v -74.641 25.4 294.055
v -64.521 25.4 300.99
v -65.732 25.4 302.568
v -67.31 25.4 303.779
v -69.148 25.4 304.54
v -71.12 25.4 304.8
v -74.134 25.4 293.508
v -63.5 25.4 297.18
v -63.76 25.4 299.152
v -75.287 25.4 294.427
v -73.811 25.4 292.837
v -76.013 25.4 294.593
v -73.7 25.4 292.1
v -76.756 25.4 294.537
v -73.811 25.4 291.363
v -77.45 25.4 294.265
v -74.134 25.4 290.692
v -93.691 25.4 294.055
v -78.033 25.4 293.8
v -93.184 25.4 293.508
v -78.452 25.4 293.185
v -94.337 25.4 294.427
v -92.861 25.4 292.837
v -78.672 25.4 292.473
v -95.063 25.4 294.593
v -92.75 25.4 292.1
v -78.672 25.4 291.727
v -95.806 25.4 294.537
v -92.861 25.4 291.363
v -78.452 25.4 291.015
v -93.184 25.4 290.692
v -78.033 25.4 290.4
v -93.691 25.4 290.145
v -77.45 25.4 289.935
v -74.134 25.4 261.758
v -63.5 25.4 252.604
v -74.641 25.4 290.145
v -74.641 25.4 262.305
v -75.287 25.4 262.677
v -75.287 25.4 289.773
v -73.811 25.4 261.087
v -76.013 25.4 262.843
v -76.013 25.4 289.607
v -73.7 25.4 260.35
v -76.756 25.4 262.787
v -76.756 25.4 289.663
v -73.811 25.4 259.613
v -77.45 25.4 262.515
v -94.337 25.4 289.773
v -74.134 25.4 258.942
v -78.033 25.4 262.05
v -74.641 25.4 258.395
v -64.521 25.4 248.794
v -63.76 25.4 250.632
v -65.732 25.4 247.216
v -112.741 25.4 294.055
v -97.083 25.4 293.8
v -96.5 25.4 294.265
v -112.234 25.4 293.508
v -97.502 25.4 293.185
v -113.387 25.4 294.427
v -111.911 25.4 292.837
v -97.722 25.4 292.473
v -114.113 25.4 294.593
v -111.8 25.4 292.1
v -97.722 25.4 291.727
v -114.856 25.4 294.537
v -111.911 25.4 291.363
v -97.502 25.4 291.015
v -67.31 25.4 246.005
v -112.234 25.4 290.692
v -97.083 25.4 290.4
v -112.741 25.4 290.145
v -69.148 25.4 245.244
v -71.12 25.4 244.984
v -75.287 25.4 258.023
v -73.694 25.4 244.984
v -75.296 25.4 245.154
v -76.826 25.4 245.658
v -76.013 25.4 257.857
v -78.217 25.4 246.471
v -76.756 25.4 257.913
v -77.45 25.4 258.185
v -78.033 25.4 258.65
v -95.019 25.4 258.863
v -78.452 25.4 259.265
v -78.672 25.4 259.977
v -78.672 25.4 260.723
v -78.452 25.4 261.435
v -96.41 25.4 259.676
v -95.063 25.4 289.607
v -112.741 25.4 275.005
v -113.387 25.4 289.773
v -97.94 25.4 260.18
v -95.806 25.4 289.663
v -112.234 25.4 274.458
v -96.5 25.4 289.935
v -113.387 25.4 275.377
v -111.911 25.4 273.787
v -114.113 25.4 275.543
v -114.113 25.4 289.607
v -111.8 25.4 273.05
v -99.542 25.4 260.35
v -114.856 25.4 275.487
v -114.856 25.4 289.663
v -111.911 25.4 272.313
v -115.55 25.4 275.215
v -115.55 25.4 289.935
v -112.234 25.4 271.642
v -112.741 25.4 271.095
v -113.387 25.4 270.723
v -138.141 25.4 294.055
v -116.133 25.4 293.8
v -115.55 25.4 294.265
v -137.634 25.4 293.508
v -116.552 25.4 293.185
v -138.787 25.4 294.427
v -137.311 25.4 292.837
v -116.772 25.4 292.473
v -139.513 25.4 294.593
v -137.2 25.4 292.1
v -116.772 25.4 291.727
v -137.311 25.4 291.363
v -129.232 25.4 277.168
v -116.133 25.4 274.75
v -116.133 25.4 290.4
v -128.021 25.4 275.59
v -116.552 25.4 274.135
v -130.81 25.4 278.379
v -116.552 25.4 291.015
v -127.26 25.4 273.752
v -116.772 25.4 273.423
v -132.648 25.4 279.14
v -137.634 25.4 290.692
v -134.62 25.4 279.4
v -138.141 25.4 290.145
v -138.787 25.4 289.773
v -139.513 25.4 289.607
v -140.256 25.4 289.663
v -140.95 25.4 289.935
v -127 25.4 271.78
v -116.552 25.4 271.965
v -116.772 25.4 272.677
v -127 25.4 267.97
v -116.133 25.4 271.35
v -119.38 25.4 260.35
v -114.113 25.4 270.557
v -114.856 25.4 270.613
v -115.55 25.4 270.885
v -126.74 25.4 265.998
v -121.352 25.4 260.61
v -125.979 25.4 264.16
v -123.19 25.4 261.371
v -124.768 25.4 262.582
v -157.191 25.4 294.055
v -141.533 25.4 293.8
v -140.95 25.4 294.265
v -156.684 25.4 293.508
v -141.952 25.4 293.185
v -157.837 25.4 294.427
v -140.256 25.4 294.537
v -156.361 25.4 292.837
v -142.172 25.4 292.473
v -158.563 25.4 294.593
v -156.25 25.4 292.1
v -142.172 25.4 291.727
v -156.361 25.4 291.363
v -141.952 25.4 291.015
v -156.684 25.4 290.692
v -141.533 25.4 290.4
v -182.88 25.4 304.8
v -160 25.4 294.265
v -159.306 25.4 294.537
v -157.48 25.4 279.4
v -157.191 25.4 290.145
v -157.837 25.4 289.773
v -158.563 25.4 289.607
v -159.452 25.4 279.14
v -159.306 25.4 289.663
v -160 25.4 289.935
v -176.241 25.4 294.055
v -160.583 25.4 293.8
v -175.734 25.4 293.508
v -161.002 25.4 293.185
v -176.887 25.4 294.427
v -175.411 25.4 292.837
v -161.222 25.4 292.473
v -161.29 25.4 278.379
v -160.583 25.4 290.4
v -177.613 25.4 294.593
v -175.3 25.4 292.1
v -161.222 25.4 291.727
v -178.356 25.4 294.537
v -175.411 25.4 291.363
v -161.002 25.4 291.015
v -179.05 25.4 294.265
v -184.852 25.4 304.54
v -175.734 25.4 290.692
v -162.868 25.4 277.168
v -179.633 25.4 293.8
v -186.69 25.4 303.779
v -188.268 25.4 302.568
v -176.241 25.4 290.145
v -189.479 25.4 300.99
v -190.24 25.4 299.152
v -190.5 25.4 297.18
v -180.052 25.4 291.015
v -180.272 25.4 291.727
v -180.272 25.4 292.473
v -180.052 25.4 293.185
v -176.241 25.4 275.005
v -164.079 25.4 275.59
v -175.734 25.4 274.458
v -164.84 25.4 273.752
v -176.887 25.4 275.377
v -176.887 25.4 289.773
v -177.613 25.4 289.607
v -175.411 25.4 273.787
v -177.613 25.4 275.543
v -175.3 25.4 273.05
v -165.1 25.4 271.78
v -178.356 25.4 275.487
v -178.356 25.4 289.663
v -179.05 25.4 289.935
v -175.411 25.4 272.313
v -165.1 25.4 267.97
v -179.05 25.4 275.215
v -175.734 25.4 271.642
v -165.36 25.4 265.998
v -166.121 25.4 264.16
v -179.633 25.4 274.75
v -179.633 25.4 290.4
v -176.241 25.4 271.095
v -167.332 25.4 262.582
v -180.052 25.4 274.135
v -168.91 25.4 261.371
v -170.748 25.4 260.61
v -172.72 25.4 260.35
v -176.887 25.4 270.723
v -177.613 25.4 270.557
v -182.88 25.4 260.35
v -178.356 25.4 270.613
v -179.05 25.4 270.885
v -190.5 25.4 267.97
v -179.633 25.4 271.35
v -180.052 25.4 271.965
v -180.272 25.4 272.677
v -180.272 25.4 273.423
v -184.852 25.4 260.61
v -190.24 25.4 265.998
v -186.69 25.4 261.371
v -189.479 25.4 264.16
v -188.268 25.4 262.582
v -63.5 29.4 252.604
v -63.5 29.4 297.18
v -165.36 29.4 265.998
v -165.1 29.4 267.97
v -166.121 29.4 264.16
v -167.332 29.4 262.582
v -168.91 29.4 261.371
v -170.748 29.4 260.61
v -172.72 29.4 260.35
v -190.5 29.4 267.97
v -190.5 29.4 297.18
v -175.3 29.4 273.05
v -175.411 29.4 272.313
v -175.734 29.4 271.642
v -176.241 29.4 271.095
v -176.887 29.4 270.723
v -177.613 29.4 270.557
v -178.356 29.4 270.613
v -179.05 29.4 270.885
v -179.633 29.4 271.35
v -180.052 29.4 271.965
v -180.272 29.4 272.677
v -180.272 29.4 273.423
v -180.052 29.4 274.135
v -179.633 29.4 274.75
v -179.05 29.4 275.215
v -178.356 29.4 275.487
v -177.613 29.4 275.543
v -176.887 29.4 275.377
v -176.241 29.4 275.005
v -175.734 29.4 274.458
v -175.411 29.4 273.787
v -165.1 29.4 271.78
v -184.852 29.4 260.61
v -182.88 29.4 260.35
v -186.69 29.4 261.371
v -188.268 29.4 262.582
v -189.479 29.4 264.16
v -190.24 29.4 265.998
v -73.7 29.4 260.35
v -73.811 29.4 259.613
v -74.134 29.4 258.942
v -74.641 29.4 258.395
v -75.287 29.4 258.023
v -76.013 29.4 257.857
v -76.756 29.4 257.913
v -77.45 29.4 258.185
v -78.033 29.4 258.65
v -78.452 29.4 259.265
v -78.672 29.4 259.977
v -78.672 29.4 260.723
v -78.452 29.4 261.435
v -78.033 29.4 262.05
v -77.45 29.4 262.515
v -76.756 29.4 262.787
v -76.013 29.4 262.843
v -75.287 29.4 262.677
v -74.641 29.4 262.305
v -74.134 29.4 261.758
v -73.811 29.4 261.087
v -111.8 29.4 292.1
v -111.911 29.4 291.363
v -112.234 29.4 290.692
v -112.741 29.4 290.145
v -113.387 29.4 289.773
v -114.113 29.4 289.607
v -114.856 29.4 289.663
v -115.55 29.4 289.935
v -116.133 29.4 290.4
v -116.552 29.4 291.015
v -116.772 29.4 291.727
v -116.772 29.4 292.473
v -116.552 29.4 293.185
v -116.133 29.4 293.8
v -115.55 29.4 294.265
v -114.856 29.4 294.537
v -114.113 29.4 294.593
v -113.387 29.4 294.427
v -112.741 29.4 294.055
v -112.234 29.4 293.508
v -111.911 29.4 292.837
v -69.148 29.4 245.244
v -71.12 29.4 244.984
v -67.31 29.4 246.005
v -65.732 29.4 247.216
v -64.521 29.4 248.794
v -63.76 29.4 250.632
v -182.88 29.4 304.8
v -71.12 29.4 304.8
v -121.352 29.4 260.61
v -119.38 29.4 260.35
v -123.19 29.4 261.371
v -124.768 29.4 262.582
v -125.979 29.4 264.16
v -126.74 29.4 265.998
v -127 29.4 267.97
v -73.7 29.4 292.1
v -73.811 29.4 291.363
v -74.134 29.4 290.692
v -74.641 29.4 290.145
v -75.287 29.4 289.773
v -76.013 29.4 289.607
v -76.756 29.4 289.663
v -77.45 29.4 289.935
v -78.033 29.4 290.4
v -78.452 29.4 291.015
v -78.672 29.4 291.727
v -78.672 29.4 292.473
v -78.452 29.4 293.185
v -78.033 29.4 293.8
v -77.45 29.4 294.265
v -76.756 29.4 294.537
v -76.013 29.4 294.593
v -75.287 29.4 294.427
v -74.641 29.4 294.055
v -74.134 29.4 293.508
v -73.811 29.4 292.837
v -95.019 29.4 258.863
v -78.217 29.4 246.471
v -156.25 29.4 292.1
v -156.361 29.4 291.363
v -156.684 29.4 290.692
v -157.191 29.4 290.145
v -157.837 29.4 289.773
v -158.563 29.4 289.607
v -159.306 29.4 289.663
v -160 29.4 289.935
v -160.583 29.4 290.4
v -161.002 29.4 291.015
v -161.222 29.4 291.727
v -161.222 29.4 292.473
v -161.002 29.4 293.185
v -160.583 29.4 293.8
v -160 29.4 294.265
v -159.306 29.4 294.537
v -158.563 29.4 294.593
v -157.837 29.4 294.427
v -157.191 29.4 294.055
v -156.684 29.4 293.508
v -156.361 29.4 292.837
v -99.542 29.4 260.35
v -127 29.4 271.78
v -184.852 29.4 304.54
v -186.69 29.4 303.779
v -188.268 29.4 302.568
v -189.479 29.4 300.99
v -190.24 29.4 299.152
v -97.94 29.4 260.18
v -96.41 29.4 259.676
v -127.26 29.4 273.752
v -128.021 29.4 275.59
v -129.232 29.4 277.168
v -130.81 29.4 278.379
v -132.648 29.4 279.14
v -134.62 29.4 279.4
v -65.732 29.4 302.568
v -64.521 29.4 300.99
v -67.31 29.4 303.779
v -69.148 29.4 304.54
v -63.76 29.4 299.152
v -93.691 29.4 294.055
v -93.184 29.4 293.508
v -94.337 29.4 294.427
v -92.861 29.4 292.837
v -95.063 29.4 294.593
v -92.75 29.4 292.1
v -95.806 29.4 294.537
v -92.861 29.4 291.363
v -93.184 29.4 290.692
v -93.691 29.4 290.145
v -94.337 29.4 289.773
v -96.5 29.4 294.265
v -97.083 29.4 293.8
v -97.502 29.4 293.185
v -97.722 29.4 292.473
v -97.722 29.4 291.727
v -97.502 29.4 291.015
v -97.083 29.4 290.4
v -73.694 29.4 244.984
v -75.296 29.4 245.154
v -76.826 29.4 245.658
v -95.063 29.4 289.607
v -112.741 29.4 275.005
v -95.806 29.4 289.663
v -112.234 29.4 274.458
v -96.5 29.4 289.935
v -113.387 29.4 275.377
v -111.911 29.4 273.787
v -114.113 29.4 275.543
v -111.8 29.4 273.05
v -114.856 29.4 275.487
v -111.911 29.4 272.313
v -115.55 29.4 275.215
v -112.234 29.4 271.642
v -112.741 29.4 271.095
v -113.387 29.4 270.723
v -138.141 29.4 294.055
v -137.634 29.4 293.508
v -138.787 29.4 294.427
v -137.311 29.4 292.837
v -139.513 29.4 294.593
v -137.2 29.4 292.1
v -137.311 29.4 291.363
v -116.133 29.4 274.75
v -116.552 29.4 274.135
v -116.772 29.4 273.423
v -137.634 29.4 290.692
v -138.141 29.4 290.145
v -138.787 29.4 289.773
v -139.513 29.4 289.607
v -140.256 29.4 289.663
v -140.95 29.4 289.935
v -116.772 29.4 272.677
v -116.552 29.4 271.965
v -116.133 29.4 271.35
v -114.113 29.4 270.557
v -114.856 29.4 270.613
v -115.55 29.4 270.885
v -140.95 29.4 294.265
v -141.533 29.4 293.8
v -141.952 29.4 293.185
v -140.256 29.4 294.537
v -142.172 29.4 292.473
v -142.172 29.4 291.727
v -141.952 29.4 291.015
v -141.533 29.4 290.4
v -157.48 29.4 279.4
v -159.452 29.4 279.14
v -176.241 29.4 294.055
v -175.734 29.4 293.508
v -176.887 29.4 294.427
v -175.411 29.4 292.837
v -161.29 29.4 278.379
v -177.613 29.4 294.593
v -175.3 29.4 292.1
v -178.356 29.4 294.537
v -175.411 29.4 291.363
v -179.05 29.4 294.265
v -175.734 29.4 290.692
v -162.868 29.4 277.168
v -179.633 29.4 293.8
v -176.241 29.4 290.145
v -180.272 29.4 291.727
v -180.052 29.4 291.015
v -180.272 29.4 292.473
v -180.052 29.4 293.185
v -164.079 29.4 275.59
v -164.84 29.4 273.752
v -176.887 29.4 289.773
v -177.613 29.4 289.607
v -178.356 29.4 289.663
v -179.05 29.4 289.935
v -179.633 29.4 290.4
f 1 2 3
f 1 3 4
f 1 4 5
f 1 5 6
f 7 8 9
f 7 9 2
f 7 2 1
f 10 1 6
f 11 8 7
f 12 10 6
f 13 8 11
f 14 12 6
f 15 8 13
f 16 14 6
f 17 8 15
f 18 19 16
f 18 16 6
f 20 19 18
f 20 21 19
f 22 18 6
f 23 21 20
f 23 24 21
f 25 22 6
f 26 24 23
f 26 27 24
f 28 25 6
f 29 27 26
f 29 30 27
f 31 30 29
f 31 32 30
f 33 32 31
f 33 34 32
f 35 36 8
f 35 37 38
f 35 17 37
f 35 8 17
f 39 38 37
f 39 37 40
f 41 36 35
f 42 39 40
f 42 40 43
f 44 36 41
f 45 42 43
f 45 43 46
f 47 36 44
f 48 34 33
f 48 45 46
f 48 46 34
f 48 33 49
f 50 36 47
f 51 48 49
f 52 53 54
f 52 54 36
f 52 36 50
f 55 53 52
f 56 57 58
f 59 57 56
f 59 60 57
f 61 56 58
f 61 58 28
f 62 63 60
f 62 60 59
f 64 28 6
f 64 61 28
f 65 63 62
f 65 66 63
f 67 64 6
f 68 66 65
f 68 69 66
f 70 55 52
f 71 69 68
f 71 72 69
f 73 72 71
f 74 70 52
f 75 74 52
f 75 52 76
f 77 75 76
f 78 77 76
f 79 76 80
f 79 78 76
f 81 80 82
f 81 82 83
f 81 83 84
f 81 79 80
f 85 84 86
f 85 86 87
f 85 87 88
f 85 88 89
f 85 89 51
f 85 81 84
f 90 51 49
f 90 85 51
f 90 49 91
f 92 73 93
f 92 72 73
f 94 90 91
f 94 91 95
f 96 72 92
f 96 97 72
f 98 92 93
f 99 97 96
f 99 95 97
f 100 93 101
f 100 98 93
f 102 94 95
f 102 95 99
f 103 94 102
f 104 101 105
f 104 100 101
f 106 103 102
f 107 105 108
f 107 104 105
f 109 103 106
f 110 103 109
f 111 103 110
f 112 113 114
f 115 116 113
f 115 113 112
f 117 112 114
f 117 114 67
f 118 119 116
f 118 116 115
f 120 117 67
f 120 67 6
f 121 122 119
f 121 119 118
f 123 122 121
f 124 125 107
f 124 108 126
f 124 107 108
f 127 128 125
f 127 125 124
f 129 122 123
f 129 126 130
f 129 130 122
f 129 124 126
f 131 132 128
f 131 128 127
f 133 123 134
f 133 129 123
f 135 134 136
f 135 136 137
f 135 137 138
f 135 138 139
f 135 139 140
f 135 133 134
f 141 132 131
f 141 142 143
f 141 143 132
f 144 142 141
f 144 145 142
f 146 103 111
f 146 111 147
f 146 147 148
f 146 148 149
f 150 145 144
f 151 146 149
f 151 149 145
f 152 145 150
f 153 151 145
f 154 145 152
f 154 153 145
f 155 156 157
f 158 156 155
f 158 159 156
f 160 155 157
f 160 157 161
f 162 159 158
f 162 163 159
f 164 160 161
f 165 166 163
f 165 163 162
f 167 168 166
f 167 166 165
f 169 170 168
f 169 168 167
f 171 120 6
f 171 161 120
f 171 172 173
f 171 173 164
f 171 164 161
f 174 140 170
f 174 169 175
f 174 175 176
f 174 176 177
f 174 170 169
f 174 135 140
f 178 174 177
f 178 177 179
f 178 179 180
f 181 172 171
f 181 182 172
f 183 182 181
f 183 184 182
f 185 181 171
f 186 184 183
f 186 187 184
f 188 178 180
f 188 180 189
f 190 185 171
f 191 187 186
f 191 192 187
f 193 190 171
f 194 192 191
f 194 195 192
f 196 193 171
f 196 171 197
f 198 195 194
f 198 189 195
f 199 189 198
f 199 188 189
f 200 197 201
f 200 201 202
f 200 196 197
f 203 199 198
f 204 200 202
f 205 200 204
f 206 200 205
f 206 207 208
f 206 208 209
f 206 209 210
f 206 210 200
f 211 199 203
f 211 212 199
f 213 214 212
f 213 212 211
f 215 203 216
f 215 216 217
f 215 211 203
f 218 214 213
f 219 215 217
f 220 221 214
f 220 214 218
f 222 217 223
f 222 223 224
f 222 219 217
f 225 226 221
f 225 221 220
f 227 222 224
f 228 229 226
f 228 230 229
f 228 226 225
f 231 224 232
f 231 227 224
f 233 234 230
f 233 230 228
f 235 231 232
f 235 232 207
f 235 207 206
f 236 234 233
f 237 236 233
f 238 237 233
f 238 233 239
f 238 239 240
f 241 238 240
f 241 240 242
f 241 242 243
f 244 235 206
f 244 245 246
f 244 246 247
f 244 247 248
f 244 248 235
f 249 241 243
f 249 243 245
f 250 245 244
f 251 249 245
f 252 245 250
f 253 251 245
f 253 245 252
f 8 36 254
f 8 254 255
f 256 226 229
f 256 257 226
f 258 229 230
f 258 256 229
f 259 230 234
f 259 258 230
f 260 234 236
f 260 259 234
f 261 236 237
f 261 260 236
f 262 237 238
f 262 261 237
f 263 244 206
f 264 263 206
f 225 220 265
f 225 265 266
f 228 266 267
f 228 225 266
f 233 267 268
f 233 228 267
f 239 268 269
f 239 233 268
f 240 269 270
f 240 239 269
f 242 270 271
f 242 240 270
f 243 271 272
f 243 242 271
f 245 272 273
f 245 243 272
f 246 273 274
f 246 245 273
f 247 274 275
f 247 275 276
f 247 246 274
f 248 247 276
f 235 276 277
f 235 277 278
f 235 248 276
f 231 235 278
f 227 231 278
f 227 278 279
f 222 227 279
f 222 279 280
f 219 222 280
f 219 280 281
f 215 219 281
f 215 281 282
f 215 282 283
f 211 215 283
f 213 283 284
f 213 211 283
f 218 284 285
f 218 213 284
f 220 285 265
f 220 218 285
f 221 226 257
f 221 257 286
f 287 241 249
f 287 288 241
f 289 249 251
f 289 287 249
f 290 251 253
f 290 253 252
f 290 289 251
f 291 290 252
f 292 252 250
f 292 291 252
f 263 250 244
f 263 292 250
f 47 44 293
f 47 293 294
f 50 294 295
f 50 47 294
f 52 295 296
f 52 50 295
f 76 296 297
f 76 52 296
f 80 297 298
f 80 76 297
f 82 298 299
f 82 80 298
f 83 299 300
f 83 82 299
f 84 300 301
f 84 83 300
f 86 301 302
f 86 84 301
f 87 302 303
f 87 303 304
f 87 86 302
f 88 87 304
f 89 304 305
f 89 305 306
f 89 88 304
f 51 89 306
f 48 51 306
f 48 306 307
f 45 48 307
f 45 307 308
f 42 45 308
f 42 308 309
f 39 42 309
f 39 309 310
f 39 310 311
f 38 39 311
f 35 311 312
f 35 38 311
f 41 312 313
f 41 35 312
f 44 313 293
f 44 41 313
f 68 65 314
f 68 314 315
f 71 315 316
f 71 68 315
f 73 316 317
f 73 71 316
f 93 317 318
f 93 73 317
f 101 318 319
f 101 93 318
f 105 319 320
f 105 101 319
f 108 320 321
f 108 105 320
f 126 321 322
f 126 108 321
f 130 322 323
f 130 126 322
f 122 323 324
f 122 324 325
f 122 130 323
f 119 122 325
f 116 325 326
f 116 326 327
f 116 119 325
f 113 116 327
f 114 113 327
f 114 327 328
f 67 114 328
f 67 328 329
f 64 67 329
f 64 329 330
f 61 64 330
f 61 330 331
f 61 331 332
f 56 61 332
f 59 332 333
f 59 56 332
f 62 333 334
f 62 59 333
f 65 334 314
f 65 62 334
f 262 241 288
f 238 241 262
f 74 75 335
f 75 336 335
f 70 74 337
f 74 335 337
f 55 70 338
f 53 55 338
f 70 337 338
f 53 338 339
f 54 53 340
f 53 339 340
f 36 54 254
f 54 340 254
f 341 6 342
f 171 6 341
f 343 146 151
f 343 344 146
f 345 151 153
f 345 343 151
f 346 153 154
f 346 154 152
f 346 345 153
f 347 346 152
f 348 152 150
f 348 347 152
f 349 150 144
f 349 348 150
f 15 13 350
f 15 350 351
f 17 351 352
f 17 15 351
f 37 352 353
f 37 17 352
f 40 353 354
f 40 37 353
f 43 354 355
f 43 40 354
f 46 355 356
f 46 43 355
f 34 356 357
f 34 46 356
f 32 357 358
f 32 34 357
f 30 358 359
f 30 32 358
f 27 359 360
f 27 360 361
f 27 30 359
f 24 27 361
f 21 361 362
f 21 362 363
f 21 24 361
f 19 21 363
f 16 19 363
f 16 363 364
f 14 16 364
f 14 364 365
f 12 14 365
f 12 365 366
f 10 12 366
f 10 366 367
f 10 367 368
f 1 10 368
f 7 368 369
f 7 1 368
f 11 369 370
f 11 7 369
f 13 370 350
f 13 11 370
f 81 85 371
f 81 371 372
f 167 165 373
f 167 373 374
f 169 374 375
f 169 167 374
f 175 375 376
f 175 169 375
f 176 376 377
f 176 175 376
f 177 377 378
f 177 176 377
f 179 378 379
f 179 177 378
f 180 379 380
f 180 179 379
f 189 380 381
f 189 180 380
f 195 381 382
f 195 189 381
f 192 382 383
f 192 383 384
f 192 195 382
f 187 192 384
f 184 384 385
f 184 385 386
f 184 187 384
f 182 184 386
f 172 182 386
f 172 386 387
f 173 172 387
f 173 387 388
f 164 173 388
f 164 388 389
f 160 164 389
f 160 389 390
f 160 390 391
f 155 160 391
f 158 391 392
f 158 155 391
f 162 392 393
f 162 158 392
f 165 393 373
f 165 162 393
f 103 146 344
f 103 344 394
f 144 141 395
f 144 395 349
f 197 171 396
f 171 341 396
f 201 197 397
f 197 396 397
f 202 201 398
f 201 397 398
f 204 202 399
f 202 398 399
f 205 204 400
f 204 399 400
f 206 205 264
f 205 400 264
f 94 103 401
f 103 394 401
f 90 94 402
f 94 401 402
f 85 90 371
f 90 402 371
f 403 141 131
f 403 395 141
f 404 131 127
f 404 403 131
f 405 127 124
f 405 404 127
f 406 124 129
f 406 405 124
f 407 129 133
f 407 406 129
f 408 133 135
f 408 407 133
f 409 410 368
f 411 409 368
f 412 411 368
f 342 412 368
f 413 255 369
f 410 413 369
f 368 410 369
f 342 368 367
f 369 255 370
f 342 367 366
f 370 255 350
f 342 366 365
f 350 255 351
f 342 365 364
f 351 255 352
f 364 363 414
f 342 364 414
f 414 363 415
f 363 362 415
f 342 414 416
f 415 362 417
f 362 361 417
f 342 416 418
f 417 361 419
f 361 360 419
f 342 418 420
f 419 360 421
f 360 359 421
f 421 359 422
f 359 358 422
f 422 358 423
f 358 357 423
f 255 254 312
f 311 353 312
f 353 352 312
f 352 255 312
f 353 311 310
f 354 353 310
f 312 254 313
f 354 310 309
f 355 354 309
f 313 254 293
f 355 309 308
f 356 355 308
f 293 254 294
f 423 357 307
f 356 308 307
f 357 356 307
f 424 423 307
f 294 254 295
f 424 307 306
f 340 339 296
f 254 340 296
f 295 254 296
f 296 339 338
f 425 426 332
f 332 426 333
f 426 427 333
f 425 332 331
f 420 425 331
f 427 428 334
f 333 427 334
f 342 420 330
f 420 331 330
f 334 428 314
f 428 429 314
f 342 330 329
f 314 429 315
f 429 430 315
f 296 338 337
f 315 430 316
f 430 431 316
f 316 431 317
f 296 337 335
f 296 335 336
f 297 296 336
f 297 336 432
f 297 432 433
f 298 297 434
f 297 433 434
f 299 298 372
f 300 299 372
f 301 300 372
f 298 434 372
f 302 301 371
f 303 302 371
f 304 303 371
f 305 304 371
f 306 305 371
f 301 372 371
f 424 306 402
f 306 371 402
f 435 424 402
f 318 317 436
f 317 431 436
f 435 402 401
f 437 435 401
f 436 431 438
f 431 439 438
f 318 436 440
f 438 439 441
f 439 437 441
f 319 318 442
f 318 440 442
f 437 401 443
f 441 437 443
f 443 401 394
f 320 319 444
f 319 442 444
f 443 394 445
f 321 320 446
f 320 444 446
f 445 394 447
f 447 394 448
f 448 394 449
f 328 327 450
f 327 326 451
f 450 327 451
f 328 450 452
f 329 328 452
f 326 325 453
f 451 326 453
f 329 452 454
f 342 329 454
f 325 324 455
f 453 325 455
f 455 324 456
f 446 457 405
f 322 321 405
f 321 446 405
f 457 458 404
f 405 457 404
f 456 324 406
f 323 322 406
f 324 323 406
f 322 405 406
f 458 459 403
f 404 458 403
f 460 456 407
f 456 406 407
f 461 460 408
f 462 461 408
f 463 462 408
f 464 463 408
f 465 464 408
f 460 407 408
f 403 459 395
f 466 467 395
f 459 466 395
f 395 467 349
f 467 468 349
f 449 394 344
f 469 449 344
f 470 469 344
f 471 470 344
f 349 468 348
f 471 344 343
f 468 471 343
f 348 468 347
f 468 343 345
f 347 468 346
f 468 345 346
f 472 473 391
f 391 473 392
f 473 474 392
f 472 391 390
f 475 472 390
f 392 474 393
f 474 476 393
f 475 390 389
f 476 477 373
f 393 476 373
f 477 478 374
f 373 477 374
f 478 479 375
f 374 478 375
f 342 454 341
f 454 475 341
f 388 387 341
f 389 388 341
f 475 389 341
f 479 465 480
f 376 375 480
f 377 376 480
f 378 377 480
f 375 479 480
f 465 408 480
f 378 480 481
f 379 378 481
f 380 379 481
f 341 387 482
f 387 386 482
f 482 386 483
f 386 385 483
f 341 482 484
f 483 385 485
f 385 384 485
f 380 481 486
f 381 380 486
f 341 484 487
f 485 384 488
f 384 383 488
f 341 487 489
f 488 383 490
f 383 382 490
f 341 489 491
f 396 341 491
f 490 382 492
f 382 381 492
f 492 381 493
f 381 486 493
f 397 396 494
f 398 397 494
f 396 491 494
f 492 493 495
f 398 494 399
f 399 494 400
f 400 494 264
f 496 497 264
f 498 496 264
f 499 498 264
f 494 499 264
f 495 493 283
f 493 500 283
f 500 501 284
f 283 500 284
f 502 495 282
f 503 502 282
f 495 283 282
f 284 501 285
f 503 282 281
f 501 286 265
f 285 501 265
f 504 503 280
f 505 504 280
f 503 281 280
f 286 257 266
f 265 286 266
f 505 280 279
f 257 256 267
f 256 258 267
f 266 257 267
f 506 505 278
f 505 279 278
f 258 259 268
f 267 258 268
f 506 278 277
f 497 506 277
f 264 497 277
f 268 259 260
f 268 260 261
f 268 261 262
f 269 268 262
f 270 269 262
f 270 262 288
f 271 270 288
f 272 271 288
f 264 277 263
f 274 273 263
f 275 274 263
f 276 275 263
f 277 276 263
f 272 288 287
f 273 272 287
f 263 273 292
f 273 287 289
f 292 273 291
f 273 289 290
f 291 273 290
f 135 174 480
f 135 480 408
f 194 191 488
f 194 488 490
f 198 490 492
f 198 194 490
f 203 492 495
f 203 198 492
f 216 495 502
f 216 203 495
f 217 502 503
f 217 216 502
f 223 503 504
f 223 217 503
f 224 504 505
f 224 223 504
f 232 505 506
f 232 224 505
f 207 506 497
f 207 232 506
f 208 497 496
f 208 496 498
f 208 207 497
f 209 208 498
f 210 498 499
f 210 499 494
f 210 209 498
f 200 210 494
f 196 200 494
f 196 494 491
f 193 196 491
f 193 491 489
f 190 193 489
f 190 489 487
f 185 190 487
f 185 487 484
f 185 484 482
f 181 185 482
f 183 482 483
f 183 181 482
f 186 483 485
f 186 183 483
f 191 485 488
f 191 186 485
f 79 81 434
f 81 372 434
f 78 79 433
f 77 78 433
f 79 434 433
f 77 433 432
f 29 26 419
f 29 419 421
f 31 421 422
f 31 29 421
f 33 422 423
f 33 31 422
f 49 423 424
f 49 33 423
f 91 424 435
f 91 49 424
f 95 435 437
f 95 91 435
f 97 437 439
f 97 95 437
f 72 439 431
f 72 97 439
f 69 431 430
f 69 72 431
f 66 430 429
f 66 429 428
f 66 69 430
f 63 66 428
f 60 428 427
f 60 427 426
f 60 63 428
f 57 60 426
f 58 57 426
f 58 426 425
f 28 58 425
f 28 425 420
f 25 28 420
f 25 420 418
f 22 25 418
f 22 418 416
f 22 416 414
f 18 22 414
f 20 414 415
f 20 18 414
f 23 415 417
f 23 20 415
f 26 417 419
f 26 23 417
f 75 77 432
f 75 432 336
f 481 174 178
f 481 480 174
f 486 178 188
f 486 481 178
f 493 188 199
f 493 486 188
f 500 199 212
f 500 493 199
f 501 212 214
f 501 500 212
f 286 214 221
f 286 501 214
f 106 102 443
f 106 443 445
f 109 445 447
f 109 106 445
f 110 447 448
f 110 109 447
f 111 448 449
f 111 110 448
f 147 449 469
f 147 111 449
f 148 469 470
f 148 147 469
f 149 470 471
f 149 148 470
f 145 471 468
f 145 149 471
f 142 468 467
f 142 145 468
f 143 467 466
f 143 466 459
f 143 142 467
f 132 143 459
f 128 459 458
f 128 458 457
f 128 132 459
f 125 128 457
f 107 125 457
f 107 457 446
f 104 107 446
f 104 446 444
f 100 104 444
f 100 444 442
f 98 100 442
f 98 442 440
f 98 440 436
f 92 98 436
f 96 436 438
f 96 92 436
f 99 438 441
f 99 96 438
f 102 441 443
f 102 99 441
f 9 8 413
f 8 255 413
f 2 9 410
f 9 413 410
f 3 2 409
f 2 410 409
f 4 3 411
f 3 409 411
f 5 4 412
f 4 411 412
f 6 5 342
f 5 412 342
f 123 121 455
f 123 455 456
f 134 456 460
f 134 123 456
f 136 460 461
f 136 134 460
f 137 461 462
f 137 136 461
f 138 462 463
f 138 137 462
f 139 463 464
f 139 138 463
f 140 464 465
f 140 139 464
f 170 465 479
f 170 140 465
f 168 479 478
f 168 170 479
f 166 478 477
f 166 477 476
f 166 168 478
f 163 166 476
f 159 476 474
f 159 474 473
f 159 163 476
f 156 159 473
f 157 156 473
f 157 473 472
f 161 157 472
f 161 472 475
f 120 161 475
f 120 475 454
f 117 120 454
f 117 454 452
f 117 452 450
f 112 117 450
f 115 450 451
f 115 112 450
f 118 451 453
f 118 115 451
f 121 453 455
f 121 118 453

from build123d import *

# Parameters (mm, degrees)
SKETCH1_R           = 2.5
BOSS_EXTRUDE1_DEPTH = 4
FILLET1_R           = 7.62


with BuildPart() as part:
    # Sketch1 → Boss-Extrude1 (new body)
    with BuildSketch(Plane(origin=(0, 25.4, 0), x_dir=(1, 0, 0), z_dir=(0, 1, 0))):
        Polygon((-127, -260.35), (-97.035940071, -260.35), (-76.2, -244.98413998), (-63.5, -244.98413998), (-63.5, -304.8), (-190.5, -304.8), (-190.5, -279.4), (-190.5, -260.35), (-165.1, -260.35), (-165.1, -279.4), (-127, -279.4), align=None)
        with Locations((-114.3, -292.1)):
            Circle(SKETCH1_R, mode=Mode.SUBTRACT)
        with Locations((-177.8, -292.1)):
            Circle(SKETCH1_R, mode=Mode.SUBTRACT)
        with Locations((-158.75, -292.1)):
            Circle(SKETCH1_R, mode=Mode.SUBTRACT)
        with Locations((-95.25, -292.1)):
            Circle(SKETCH1_R, mode=Mode.SUBTRACT)
        with Locations((-139.7, -292.1)):
            Circle(SKETCH1_R, mode=Mode.SUBTRACT)
        with Locations((-76.2, -292.1)):
            Circle(SKETCH1_R, mode=Mode.SUBTRACT)
        with Locations((-114.3, -273.05)):
            Circle(SKETCH1_R, mode=Mode.SUBTRACT)
        with Locations((-177.8, -273.05)):
            Circle(SKETCH1_R, mode=Mode.SUBTRACT)
        with Locations((-76.2, -260.35)):
            Circle(SKETCH1_R, mode=Mode.SUBTRACT)
    extrude(amount=BOSS_EXTRUDE1_DEPTH)

    # Fillet1
    fillet1_edges = [part.edges().sort_by_distance(p)[0] for p in [
        (-190.5, 27.4, 304.8),
        (-190.5, 27.4, 260.35),
        (-165.1, 27.4, 260.35),
        (-165.1, 27.4, 279.4),
        (-127, 27.4, 279.4),
        (-127, 27.4, 260.35),
        (-97.035940071, 27.4, 260.35),
        (-76.2, 27.4, 244.98413998),
        (-63.5, 27.4, 244.98413998),
        (-63.5, 27.4, 304.8),
    ]]
    fillet(fillet1_edges, radius=FILLET1_R)


solid = part.part
